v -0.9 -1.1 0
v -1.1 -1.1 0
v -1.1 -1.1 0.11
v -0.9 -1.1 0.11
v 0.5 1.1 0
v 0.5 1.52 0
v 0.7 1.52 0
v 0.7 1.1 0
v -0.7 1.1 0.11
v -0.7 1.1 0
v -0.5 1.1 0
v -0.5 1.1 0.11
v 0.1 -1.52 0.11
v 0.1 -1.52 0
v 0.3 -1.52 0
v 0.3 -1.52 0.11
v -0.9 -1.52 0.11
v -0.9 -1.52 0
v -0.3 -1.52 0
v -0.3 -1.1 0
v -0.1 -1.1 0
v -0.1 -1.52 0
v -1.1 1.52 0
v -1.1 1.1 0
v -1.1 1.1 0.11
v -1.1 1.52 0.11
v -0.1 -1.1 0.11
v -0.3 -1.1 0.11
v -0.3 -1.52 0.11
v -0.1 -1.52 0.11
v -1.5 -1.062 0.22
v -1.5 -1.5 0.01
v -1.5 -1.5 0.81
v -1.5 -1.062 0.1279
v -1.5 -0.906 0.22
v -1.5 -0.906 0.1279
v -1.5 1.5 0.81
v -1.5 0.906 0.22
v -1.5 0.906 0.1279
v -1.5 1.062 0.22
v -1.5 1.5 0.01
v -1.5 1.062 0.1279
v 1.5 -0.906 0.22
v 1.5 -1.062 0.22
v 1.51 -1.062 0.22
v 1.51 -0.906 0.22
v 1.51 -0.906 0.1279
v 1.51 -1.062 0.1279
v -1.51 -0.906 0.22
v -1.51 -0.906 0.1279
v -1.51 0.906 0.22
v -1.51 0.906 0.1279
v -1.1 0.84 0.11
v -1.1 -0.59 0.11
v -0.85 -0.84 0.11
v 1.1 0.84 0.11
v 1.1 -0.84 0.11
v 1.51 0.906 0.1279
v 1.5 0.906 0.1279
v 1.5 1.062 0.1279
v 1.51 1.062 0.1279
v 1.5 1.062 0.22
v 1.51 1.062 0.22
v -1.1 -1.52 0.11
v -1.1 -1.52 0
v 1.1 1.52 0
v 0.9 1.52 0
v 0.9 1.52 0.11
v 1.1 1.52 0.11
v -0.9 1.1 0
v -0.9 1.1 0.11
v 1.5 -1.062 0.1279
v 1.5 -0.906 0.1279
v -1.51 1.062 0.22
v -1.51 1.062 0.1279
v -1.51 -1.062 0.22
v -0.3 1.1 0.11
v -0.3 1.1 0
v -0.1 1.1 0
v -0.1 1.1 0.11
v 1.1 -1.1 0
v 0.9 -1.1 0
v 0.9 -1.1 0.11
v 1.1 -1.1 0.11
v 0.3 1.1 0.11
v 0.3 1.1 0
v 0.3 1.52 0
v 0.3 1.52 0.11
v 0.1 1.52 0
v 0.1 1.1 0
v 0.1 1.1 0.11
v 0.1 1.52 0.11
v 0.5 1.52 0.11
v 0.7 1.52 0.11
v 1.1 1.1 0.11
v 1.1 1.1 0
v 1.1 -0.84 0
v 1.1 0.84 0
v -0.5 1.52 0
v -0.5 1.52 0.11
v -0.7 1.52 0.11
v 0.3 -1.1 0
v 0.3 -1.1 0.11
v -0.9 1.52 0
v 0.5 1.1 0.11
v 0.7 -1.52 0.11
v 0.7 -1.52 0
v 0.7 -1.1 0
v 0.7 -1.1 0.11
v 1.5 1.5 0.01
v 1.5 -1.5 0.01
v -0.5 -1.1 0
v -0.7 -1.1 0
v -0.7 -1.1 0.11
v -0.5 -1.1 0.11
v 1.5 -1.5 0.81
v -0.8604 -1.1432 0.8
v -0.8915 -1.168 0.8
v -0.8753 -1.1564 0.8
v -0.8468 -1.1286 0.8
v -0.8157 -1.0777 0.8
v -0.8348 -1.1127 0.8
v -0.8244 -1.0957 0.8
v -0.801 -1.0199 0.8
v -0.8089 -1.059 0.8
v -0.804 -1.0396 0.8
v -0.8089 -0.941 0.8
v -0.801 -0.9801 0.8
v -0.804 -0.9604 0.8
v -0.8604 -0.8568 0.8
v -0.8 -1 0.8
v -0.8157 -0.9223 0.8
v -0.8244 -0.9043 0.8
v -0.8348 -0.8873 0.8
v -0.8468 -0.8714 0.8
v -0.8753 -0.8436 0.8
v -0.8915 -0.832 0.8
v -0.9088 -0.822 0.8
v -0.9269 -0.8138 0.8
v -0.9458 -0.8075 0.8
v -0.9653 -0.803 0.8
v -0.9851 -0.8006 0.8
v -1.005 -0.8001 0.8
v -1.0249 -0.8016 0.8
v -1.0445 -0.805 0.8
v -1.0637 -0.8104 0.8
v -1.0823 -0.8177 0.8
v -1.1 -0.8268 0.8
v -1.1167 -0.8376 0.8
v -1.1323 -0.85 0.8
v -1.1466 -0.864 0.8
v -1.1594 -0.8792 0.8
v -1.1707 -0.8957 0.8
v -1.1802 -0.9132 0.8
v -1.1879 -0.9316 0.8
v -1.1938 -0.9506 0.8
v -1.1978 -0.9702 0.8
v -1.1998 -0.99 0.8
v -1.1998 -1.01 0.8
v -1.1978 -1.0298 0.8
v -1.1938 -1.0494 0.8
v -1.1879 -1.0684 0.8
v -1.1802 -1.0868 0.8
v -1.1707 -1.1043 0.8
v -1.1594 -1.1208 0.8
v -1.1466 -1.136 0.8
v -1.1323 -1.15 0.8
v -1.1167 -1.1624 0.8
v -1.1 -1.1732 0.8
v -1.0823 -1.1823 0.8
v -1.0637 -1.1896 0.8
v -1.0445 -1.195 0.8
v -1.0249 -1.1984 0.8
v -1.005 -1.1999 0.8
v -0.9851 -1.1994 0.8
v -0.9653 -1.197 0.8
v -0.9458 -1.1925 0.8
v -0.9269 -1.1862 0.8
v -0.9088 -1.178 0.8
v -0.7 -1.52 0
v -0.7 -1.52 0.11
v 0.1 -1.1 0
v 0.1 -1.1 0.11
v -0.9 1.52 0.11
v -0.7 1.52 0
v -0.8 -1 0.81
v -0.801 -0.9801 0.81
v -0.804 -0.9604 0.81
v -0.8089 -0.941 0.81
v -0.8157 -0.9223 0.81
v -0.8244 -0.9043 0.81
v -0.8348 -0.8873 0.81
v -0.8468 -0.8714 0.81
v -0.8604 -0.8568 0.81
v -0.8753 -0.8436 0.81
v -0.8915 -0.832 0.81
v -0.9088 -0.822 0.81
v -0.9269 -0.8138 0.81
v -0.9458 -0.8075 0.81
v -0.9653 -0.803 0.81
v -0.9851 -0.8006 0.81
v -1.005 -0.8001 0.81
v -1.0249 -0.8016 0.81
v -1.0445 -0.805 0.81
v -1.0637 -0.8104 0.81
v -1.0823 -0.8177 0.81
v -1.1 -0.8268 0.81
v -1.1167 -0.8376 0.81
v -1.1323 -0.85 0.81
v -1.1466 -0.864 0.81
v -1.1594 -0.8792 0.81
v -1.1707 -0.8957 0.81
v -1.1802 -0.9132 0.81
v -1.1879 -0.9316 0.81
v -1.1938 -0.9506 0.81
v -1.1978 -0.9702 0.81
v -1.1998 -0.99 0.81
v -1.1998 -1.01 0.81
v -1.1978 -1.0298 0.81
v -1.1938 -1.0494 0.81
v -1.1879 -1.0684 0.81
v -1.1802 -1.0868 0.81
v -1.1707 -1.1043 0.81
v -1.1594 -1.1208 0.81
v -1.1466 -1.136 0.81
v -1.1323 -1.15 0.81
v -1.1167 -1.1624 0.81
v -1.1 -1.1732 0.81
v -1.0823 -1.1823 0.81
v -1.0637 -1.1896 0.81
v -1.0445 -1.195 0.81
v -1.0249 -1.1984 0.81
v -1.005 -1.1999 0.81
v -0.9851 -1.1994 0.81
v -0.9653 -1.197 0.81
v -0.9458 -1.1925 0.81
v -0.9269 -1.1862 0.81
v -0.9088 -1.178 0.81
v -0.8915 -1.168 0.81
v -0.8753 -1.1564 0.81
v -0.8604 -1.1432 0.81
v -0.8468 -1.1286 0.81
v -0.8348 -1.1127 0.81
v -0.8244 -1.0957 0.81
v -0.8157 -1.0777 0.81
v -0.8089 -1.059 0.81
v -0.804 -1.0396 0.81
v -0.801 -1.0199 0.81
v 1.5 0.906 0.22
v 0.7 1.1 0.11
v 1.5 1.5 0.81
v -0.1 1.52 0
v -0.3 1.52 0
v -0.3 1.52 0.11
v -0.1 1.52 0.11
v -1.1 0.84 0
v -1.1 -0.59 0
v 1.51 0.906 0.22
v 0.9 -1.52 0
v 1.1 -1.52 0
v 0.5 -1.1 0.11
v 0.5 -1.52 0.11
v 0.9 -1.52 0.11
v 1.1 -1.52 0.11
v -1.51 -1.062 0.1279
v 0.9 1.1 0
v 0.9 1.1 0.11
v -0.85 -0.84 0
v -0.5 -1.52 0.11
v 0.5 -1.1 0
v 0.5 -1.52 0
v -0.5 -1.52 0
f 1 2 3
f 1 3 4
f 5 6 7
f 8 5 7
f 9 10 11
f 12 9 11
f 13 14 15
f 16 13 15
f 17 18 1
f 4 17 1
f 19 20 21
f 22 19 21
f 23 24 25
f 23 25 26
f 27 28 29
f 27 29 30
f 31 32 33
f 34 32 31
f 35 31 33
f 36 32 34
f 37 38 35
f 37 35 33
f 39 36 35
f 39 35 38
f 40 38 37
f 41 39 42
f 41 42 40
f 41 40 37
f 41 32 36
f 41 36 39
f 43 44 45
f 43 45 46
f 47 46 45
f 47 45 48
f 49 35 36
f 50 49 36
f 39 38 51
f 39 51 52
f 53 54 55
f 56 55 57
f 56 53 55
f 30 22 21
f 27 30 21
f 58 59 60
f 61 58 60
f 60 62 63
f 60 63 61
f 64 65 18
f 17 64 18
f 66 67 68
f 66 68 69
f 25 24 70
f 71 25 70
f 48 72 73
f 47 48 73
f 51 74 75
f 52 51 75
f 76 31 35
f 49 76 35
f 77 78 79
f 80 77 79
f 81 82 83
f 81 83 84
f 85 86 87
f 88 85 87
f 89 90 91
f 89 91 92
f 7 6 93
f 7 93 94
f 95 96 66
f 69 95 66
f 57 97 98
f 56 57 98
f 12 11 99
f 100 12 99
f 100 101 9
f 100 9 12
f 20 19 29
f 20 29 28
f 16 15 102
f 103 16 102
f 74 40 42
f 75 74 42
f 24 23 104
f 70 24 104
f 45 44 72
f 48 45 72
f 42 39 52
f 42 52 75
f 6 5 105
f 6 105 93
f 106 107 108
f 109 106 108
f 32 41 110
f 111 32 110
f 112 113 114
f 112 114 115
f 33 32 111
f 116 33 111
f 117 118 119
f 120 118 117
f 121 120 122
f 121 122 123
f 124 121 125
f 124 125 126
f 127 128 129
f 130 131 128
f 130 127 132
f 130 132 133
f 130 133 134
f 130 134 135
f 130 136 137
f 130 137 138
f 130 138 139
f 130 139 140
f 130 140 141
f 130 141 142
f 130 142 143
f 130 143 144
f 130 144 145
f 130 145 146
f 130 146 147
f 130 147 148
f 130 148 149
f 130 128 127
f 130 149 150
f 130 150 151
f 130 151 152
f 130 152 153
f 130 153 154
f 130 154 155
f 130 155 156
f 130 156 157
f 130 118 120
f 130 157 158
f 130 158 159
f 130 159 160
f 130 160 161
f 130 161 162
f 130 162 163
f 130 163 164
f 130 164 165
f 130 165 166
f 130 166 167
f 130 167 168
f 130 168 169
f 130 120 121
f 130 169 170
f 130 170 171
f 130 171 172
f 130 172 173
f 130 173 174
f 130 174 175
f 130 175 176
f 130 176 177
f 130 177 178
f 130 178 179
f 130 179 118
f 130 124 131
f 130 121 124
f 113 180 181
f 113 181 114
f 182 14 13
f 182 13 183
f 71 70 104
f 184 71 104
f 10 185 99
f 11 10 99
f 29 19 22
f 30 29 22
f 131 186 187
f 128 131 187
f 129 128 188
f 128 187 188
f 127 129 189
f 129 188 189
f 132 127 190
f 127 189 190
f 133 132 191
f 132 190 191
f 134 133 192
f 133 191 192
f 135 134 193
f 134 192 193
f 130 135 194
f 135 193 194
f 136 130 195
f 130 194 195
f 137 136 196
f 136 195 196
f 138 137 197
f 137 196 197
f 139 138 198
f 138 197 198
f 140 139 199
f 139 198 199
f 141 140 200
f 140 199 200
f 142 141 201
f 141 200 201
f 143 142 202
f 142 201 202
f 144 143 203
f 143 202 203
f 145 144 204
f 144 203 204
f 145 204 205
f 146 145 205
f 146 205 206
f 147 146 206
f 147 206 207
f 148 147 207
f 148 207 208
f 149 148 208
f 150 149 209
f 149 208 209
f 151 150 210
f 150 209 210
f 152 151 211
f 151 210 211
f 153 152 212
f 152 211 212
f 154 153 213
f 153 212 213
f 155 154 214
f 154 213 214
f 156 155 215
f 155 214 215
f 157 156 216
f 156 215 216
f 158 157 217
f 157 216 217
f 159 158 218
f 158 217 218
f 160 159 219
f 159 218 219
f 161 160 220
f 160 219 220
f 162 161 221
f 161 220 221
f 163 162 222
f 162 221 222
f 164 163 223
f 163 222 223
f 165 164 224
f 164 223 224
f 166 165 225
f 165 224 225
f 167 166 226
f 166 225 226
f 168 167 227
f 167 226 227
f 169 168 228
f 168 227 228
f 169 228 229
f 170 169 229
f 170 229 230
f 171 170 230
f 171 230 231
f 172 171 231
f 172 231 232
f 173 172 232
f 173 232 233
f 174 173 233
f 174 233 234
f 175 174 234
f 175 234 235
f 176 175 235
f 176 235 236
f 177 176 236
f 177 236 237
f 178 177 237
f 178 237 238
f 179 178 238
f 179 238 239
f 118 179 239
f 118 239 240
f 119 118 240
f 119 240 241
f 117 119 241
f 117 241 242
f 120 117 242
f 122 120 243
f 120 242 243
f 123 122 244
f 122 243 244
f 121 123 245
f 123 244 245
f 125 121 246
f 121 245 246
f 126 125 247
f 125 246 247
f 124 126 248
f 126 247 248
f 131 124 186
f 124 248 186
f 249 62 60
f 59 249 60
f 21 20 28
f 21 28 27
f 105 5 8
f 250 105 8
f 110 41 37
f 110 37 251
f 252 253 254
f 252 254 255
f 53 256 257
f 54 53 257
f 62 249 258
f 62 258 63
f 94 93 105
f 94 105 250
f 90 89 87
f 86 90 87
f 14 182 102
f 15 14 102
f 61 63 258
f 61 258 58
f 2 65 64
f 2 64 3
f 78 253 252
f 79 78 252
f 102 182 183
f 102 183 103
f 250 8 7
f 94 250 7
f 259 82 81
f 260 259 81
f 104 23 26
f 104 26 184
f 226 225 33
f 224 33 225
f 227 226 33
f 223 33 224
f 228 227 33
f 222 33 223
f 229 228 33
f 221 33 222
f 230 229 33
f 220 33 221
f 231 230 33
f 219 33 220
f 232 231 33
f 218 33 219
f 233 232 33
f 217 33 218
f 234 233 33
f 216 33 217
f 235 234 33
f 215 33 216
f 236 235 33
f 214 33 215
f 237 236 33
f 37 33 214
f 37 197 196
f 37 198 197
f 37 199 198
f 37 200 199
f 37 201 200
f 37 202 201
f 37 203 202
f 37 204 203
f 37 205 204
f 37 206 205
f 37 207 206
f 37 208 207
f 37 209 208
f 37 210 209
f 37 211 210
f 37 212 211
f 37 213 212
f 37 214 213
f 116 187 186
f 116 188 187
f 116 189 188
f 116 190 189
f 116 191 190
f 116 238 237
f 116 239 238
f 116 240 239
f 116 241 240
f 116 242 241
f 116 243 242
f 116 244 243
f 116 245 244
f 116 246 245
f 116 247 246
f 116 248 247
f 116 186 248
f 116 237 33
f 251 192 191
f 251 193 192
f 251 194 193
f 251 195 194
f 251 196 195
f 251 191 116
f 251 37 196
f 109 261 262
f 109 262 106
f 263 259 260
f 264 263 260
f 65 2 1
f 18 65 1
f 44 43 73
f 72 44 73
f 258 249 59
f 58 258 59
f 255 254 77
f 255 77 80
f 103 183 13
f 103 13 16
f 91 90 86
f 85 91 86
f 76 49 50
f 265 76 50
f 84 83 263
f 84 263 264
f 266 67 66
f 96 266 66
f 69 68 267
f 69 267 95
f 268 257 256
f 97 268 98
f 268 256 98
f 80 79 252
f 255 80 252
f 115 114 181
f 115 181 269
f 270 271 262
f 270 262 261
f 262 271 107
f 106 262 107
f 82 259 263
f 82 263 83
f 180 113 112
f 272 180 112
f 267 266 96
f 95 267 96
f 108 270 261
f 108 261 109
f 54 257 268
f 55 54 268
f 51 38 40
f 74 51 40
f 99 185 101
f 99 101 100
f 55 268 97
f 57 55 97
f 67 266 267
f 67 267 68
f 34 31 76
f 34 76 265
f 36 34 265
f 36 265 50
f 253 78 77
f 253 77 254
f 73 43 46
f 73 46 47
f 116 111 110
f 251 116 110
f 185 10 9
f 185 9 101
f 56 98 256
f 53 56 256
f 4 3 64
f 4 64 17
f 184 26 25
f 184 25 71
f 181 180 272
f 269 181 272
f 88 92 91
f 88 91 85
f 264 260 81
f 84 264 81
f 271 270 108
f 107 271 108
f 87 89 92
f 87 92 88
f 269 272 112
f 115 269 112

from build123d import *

# Parameters (mm, degrees)
SKETCH1_W              = 3
SKETCH1_H              = 3
BOSS_EXTRUDE1_DEPTH    = 0.8
SKETCH2_W              = 0.2
SKETCH2_H              = 0.42
BOSS_EXTRUDE2_DEPTH    = 0.11
BOSS_EXTRUDE2_2_DEPTH  = 0.11
BOSS_EXTRUDE2_3_DEPTH  = 0.11
BOSS_EXTRUDE2_4_DEPTH  = 0.11
BOSS_EXTRUDE2_5_DEPTH  = 0.11
BOSS_EXTRUDE2_6_DEPTH  = 0.11
BOSS_EXTRUDE2_7_DEPTH  = 0.11
BOSS_EXTRUDE2_8_DEPTH  = 0.11
BOSS_EXTRUDE2_9_DEPTH  = 0.11
BOSS_EXTRUDE2_10_DEPTH = 0.11
BOSS_EXTRUDE2_11_DEPTH = 0.11
BOSS_EXTRUDE2_12_DEPTH = 0.11
BOSS_EXTRUDE2_13_DEPTH = 0.11
SKETCH3_W              = 0.092125769
SKETCH3_H              = 0.15597197
BOSS_EXTRUDE3_DEPTH    = 0.01
BOSS_EXTRUDE3_2_DEPTH  = 0.01
SKETCH4_R              = 0.2
CUT_EXTRUDE1_DEPTH     = 0.01


with BuildPart() as part:
    # Sketch1 → Boss-Extrude1 (new body)
    with BuildSketch(Plane.XY.offset(0.01)):
        Rectangle(SKETCH1_W, SKETCH1_H)
    extrude(amount=BOSS_EXTRUDE1_DEPTH)


with BuildPart() as body_2:
    # Sketch2 → Boss-Extrude2 (new body)
    with BuildSketch(Plane.XY):
        with Locations((-1, -1.31)):
            Rectangle(SKETCH2_W, SKETCH2_H)
    extrude(amount=BOSS_EXTRUDE2_DEPTH)


with BuildPart() as body_3:
    # Sketch2 → Boss-Extrude2 2 (new body)
    with BuildSketch(Plane.XY):
        with Locations((-0.6, -1.31)):
            Rectangle(SKETCH2_W, SKETCH2_H)
    extrude(amount=BOSS_EXTRUDE2_2_DEPTH)


with BuildPart() as body_4:
    # Sketch2 → Boss-Extrude2 3 (new body)
    with BuildSketch(Plane.XY):
        with Locations((-0.2, -1.31)):
            Rectangle(SKETCH2_W, SKETCH2_H)
    extrude(amount=BOSS_EXTRUDE2_3_DEPTH)


with BuildPart() as body_5:
    # Sketch2 → Boss-Extrude2 4 (new body)
    with BuildSketch(Plane.XY):
        with Locations((0.2, -1.31)):
            Rectangle(SKETCH2_W, SKETCH2_H)
    extrude(amount=BOSS_EXTRUDE2_4_DEPTH)


with BuildPart() as body_6:
    # Sketch2 → Boss-Extrude2 5 (new body)
    with BuildSketch(Plane.XY):
        with Locations((0.6, -1.31)):
            Rectangle(SKETCH2_W, SKETCH2_H)
    extrude(amount=BOSS_EXTRUDE2_5_DEPTH)


with BuildPart() as body_7:
    # Sketch2 → Boss-Extrude2 6 (new body)
    with BuildSketch(Plane.XY):
        with Locations((1, -1.31)):
            Rectangle(SKETCH2_W, SKETCH2_H)
    extrude(amount=BOSS_EXTRUDE2_6_DEPTH)


with BuildPart() as body_8:
    # Sketch2 → Boss-Extrude2 7 (new body)
    with BuildSketch(Plane.XY):
        with Locations((1, 1.31)):
            Rectangle(SKETCH2_W, SKETCH2_H)
    extrude(amount=BOSS_EXTRUDE2_7_DEPTH)


with BuildPart() as body_9:
    # Sketch2 → Boss-Extrude2 8 (new body)
    with BuildSketch(Plane.XY):
        with Locations((0.6, 1.31)):
            Rectangle(SKETCH2_W, SKETCH2_H)
    extrude(amount=BOSS_EXTRUDE2_8_DEPTH)


with BuildPart() as body_10:
    # Sketch2 → Boss-Extrude2 9 (new body)
    with BuildSketch(Plane.XY):
        with Locations((0.2, 1.31)):
            Rectangle(SKETCH2_W, SKETCH2_H)
    extrude(amount=BOSS_EXTRUDE2_9_DEPTH)


with BuildPart() as body_11:
    # Sketch2 → Boss-Extrude2 10 (new body)
    with BuildSketch(Plane.XY):
        with Locations((-0.2, 1.31)):
            Rectangle(SKETCH2_W, SKETCH2_H)
    extrude(amount=BOSS_EXTRUDE2_10_DEPTH)


with BuildPart() as body_12:
    # Sketch2 → Boss-Extrude2 11 (new body)
    with BuildSketch(Plane.XY):
        with Locations((-0.6, 1.31)):
            Rectangle(SKETCH2_W, SKETCH2_H)
    extrude(amount=BOSS_EXTRUDE2_11_DEPTH)


with BuildPart() as body_13:
    # Sketch2 → Boss-Extrude2 12 (new body)
    with BuildSketch(Plane.XY):
        with Locations((-1, 1.31)):
            Rectangle(SKETCH2_W, SKETCH2_H)
    extrude(amount=BOSS_EXTRUDE2_12_DEPTH)


with BuildPart() as body_14:
    # Sketch2 → Boss-Extrude2 13 (new body)
    with BuildSketch(Plane.XY):
        Polygon((-1.1, -0.59), (-0.85, -0.84), (1.1, -0.84), (1.1, 0.84), (-1.1, 0.84), align=None)
    extrude(amount=BOSS_EXTRUDE2_13_DEPTH)


with BuildPart() as body_15:
    # Sketch3 → Boss-Extrude3 (new body)
    with BuildSketch(Plane(origin=(1.5, 0, 0), x_dir=(0, 0, -1), z_dir=(1, 0, 0))):
        with Locations((-0.173937116, 0.983999633)):
            Rectangle(SKETCH3_W, SKETCH3_H)
    boss_extrude3 = extrude(amount=BOSS_EXTRUDE3_DEPTH)


with BuildPart() as body_16:
    # Sketch3 → Boss-Extrude3 2 (new body)
    with BuildSketch(Plane(origin=(1.5, 0, 0), x_dir=(0, 0, -1), z_dir=(1, 0, 0))):
        with Locations((-0.173937116, -0.983999633)):
            Rectangle(SKETCH3_W, SKETCH3_H)
    boss_extrude3_2 = extrude(amount=BOSS_EXTRUDE3_2_DEPTH)


with BuildPart() as part_1:
    add(part.part)

    # Mirror1: Boss-Extrude3, Boss-Extrude3 2 across plane
    add(boss_extrude3.mirror(Plane(origin=(0, 0, 0), x_dir=(0, 0, 1), z_dir=(1, 0, 0))))
    add(boss_extrude3_2.mirror(Plane(origin=(0, 0, 0), x_dir=(0, 0, 1), z_dir=(1, 0, 0))))

    # Sketch4 → Cut-Extrude1 (cut)
    with BuildSketch(Plane.XY.offset(0.81)):
        with Locations((-1, -1)):
            Circle(SKETCH4_R)
    extrude(amount=-CUT_EXTRUDE1_DEPTH, mode=Mode.SUBTRACT)


solid = Compound([body_2.part, body_3.part, body_4.part, body_5.part, body_6.part, body_7.part, body_8.part, body_9.part, body_10.part, body_11.part, body_12.part, body_13.part, body_14.part, body_15.part, body_16.part, part_1.part])
